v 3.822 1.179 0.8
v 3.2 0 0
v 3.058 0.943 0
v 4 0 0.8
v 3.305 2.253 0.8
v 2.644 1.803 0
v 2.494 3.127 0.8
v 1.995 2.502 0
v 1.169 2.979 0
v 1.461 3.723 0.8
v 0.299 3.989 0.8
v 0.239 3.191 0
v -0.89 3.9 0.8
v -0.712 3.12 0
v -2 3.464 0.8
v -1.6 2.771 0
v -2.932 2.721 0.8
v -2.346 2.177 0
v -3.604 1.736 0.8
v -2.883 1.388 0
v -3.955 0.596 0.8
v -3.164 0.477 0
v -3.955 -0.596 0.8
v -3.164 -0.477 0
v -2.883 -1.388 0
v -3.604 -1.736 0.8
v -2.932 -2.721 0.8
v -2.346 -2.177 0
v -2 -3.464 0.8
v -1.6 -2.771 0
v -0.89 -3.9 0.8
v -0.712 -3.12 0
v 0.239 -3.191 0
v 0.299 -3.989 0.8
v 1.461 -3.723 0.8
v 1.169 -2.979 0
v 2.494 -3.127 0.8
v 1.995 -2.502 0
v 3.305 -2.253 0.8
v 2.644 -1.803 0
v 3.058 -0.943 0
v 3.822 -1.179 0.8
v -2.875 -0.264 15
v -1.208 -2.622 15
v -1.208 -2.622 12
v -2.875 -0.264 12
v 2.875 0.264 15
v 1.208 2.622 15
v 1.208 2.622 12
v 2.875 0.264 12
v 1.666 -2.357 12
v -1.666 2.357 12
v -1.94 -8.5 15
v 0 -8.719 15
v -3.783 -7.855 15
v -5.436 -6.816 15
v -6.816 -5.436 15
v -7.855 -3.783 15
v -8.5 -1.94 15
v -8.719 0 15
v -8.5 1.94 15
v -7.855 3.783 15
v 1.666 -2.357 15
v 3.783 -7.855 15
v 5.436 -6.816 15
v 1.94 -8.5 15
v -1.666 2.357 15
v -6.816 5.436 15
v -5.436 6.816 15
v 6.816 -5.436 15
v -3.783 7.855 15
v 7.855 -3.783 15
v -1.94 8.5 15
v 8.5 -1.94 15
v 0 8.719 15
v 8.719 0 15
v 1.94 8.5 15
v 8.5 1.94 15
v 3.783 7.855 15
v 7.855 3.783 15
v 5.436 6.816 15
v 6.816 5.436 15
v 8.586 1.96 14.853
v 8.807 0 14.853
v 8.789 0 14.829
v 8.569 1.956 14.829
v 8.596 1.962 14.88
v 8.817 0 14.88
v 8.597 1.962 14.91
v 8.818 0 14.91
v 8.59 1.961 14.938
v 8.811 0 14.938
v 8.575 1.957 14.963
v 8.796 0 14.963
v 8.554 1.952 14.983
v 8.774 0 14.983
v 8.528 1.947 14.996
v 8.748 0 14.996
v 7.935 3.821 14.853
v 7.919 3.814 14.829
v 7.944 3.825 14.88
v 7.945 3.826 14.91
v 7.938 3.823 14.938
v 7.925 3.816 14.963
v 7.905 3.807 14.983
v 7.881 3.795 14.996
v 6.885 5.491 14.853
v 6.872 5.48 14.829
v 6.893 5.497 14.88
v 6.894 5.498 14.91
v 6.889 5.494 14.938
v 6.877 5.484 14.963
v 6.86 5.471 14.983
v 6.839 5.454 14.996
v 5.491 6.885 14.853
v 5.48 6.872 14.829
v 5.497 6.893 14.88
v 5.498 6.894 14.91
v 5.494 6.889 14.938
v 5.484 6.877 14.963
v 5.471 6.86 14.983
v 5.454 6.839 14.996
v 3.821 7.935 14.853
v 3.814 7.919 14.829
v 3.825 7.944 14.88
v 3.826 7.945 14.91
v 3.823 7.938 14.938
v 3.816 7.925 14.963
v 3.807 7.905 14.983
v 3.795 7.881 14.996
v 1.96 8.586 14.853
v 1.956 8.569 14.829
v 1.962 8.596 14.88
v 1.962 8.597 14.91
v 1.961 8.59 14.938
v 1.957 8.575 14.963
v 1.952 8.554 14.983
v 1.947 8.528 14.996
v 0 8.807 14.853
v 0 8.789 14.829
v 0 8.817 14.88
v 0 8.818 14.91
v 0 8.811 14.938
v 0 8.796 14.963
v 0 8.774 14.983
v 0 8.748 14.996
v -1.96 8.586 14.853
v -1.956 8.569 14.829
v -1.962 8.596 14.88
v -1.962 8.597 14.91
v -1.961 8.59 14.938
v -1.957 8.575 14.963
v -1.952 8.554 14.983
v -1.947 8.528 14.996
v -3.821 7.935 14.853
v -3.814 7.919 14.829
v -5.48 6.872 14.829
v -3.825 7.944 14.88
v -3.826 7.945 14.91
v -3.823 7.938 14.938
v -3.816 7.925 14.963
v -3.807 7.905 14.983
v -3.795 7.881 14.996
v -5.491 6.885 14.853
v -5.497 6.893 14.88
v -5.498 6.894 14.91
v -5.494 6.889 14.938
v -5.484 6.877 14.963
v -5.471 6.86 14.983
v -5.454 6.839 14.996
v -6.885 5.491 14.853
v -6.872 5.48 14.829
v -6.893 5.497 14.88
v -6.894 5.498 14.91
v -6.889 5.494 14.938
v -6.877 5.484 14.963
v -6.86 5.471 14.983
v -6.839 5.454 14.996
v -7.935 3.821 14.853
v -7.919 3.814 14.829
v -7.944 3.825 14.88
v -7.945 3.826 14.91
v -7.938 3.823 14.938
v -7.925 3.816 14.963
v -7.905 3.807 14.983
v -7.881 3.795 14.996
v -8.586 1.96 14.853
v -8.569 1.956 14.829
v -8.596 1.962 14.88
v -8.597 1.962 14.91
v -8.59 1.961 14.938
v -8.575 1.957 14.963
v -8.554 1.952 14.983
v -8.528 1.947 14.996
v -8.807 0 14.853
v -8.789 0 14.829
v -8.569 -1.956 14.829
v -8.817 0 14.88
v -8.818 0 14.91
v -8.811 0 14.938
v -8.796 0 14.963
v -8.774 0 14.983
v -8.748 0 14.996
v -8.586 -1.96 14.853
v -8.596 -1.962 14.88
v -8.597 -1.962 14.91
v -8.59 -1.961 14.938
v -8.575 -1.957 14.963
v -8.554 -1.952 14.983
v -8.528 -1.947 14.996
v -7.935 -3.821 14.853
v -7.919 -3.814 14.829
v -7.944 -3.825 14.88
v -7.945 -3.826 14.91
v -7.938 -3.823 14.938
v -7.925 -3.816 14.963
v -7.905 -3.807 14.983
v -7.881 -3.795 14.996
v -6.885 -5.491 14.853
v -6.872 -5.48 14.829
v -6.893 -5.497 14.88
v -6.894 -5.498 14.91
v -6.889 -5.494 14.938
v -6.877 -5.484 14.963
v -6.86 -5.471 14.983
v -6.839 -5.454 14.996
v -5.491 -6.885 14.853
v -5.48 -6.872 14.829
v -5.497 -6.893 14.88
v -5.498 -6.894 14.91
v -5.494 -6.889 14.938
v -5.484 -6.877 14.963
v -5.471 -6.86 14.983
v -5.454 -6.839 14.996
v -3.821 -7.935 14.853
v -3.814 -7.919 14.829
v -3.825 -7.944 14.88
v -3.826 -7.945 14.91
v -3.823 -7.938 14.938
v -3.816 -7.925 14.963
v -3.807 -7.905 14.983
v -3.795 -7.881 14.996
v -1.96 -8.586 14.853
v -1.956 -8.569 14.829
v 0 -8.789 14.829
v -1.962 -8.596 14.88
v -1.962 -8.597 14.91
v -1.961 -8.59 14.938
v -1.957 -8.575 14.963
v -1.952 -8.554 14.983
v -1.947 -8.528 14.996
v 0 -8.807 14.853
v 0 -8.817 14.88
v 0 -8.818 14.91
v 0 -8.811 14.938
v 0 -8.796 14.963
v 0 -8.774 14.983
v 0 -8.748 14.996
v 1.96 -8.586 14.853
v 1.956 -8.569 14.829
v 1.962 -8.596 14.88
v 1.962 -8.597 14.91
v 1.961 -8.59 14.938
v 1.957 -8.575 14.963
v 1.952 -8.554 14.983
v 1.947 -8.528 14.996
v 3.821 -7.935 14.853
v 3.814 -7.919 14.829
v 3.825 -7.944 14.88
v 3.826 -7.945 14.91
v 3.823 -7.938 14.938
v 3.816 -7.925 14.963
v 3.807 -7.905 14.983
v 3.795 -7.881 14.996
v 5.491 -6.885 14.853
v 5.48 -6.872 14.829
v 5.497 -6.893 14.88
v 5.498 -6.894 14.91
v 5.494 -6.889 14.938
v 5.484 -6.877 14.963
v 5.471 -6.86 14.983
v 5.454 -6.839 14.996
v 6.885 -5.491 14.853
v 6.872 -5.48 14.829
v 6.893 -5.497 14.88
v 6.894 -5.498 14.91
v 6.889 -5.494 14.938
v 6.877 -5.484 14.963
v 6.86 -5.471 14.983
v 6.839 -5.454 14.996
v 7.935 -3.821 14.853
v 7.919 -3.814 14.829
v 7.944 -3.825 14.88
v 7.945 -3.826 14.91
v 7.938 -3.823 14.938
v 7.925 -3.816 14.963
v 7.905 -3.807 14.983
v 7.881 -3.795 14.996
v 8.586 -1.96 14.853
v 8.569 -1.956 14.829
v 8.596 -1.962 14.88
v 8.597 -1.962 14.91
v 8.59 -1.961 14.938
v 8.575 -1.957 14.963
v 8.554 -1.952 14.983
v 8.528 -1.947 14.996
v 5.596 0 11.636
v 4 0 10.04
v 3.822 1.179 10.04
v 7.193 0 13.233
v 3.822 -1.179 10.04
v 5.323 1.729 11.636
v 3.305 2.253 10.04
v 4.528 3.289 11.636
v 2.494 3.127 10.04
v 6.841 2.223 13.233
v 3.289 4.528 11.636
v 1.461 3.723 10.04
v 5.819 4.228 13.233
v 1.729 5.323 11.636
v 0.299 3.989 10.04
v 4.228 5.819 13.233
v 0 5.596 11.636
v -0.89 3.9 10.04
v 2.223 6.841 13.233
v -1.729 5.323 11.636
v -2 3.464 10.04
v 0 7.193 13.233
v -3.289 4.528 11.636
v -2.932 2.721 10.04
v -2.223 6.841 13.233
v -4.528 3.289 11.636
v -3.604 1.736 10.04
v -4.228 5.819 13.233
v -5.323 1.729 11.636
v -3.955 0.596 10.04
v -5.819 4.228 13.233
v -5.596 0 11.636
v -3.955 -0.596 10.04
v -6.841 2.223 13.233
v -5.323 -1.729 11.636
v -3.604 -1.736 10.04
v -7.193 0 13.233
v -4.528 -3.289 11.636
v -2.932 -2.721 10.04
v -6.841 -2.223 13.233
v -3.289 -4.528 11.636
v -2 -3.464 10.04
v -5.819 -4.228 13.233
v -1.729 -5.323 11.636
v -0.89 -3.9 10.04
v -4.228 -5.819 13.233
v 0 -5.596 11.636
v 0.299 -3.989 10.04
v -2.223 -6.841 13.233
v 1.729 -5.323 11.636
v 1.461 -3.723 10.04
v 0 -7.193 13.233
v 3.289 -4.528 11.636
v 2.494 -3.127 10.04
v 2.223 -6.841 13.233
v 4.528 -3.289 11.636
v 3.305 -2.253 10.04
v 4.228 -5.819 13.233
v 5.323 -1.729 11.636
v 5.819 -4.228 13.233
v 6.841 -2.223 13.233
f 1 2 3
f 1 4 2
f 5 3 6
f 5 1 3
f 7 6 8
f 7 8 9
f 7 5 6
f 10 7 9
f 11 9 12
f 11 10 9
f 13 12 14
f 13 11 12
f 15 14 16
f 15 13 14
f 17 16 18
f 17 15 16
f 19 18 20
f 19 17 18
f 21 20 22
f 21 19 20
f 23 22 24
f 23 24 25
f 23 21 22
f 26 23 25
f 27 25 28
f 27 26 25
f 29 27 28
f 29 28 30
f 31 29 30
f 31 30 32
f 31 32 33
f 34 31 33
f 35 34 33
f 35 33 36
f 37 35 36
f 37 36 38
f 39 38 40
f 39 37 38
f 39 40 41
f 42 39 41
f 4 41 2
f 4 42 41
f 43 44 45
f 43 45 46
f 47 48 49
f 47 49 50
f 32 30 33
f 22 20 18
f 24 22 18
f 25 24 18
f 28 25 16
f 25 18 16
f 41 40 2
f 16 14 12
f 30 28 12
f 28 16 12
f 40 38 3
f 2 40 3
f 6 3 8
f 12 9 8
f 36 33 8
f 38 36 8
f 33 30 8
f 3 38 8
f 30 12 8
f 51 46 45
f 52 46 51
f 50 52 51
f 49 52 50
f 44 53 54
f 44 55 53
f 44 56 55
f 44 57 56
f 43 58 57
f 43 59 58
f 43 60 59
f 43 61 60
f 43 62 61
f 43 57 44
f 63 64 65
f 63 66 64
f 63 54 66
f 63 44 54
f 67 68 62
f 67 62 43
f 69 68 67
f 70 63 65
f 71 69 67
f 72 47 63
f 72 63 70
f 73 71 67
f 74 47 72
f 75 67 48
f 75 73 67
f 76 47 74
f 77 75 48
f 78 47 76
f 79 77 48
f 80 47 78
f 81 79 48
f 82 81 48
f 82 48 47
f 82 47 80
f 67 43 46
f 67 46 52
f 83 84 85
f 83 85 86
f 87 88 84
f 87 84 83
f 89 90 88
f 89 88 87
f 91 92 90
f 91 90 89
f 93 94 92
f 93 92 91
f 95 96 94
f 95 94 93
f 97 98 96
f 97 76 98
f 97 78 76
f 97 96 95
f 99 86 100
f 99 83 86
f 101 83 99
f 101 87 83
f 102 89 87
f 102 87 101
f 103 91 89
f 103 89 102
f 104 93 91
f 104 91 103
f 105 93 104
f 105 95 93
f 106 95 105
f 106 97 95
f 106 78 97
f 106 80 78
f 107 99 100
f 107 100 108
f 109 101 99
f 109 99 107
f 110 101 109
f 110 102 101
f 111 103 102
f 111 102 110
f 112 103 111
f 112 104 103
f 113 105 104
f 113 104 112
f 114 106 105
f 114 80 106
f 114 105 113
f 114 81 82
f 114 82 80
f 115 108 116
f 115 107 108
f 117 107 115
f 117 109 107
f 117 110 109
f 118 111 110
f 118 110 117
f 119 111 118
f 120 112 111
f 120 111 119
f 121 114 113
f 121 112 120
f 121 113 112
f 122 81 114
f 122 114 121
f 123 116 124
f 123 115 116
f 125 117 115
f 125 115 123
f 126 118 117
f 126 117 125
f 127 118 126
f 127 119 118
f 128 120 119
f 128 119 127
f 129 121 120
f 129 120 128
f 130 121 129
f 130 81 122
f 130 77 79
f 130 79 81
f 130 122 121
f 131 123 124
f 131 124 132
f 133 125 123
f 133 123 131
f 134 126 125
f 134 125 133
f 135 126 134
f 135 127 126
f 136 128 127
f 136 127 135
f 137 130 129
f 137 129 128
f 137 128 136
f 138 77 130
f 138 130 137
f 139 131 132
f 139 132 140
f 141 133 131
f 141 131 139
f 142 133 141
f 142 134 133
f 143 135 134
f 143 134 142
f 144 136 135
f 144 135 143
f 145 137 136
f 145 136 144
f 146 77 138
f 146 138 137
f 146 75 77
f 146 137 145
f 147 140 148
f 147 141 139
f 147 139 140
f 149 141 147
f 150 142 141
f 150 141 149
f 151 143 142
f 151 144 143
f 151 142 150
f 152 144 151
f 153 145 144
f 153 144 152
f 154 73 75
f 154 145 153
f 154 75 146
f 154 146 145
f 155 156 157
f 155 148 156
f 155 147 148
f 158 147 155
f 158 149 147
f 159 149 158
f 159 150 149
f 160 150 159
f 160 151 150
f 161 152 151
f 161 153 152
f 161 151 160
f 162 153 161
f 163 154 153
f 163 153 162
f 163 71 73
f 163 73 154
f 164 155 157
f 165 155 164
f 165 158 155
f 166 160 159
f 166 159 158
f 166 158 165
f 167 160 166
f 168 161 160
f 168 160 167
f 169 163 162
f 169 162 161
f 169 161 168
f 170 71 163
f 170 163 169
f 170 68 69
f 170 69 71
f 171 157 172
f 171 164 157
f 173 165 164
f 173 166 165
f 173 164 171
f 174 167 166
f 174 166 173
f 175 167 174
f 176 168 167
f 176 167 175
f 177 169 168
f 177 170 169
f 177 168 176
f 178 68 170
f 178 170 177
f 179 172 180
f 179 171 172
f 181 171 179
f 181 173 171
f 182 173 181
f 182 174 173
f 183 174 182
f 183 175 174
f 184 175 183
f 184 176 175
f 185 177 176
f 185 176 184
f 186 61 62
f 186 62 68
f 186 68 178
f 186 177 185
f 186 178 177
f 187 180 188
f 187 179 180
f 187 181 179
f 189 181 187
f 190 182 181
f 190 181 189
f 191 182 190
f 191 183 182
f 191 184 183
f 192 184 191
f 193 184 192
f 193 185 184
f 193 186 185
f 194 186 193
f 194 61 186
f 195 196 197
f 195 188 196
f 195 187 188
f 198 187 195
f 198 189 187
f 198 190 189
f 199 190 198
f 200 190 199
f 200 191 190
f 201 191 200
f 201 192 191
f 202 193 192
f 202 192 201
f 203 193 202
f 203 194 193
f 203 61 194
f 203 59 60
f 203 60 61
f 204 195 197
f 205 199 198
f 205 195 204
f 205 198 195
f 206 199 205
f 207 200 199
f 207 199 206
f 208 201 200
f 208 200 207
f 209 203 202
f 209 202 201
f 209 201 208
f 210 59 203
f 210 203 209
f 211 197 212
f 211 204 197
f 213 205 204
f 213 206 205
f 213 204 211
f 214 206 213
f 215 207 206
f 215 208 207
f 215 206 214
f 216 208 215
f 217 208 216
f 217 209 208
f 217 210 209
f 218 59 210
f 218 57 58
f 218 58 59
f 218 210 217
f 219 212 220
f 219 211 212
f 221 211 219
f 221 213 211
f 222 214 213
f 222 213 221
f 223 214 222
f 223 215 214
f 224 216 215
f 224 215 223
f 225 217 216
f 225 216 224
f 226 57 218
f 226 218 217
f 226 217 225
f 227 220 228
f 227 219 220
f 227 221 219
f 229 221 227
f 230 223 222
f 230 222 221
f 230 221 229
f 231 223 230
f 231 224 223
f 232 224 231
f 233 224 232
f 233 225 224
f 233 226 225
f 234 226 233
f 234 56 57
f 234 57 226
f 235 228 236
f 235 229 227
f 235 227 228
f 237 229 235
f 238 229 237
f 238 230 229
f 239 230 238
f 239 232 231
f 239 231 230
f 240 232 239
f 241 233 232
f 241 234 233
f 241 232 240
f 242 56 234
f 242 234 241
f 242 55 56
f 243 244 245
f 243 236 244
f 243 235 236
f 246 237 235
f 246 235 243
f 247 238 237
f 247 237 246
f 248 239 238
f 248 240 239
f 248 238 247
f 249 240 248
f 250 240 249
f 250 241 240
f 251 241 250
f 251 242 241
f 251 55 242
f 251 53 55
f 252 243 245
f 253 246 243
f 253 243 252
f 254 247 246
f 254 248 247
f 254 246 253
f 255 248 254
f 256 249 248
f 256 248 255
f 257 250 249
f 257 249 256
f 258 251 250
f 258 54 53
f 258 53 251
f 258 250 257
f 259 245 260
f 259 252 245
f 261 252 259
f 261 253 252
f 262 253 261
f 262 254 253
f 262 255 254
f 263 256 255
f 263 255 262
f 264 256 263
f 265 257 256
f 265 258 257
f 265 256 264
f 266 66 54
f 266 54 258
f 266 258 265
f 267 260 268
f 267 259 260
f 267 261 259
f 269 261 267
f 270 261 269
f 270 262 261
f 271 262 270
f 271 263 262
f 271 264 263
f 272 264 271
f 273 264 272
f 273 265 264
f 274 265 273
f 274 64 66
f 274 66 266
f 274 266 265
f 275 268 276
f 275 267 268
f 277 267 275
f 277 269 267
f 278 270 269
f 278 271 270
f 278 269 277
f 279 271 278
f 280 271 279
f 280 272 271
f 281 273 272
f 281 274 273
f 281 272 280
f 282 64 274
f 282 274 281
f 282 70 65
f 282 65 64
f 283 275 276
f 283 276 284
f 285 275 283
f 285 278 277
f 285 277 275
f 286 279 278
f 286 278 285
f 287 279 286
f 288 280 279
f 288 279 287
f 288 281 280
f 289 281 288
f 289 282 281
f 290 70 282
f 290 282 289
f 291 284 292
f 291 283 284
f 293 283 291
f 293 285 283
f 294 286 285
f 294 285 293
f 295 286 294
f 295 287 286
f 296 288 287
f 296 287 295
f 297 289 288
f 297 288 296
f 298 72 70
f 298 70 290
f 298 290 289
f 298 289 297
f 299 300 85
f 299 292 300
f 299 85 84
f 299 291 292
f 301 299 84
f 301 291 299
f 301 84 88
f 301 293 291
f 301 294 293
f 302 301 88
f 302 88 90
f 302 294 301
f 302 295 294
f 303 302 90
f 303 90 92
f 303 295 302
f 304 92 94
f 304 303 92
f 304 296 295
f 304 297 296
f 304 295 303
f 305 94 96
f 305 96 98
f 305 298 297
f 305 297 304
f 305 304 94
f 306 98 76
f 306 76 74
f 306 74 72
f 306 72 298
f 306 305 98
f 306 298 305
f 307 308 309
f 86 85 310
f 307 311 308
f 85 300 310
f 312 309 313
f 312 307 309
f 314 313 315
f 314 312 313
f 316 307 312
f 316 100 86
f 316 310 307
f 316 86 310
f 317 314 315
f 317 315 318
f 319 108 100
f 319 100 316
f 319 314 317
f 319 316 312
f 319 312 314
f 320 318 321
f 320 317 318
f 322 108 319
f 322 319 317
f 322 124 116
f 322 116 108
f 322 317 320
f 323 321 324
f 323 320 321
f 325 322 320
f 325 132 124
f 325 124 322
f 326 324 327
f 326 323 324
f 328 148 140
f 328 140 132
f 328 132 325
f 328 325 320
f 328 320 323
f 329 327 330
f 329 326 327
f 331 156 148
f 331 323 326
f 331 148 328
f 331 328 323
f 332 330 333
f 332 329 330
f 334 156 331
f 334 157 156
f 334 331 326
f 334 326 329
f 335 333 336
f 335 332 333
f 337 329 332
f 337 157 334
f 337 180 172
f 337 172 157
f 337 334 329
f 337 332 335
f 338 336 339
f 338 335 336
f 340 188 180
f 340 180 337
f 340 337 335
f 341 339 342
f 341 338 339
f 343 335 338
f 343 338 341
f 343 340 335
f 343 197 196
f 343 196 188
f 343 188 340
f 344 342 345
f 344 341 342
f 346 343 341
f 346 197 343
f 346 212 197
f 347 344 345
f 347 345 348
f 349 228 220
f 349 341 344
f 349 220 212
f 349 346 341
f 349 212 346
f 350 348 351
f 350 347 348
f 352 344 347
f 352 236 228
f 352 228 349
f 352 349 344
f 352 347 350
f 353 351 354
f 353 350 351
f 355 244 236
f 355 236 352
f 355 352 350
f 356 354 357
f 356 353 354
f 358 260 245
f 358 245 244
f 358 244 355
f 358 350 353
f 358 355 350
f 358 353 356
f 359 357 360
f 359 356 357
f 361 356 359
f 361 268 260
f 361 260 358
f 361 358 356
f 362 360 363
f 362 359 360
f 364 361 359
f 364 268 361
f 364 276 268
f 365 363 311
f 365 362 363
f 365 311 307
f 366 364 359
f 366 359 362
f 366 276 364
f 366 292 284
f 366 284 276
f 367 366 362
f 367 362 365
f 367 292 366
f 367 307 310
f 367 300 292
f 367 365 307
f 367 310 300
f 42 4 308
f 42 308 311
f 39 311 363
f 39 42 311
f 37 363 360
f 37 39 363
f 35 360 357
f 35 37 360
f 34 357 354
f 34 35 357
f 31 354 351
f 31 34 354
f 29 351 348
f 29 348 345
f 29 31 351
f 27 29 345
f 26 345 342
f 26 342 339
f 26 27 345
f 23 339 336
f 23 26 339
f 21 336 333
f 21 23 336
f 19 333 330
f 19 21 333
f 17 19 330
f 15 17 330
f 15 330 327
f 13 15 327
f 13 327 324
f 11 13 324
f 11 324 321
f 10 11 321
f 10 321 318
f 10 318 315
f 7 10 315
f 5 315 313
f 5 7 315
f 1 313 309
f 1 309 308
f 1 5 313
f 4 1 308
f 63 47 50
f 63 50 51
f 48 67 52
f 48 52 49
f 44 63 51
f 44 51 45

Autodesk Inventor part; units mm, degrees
ref_plane "YZ Plane" through (0, 0, 0) normal (1, 0, 0) x (0, 1, 0)
ref_plane "XZ Plane" through (0, 0, 0) normal (0, 1, 0) x (-1, 0, 0)
ref_plane "XY Plane" through (0, 0, 0) normal (0, 0, 1) x (1, 0, 0)
sketch "Sketch1" plane through (0, 0, 0) normal (0, 0, 1) x (1, 0, 0)
  circle A0 centre (0, 0) radius 4
  dimension "Diameter" = 8
extrude "Extrusion1" add sketch "Sketch1" along normal blind 10.04
sketch "Sketch2" plane through (0, 0, 10.04) normal (0, 0, 1) x (1, 0, 0)
  circle A0 centre (0, 0) radius 4 projected
extrude "Extrusion2" add sketch "Sketch2" along normal blind 4.96 draft 45
sketch "Sketch3" plane through (0, 0, 15) normal (0, 0, 1) x (1, 0, 0)
  circle A0 centre (0, 0) radius 8.96 projected
  circle A1 centre (0, 0) radius 2.8868 construction
  line L0 (1.2084, 2.6217) -> (2.8746, 0.2644)
  line L1 (2.8746, 0.2644) -> (1.6662, -2.3573)
  line L2 (1.6662, -2.3573) -> (-1.2084, -2.6217)
  line L3 (-1.2084, -2.6217) -> (-2.8746, -0.2644)
  line L4 (-2.8746, -0.2644) -> (-1.6662, 2.3573)
  line L5 (-1.6662, 2.3573) -> (1.2084, 2.6217)
  dimension "Hex_Width" = 5
extrude "Extrusion3" cut sketch "Sketch3" against normal blind 3 contours L0 L1 L2 L3 L4 L5
thread "Thread1" size "M8x1.25" class "4g6g" standard "ANSI Metric M Profile" length 10.04
chamfer "Chamfer2" distance 0.8 angle 45 1 edges at (-4, 0, 0)
fillet "Fillet1" radius 0.1 1 edges at (-8.96, 0, 15)
equation "\"d10\" = Thread_Length"
equation "\"d13\" = Chamfer"
equation "\"Thread_Length\" = 10.04"
equation "\"Length\" = 15"
equation "\"Chamfer\" = 0.8"
properties part number "SCREW,FLAT HD,P,12.9,M8X1.25X15MM"
